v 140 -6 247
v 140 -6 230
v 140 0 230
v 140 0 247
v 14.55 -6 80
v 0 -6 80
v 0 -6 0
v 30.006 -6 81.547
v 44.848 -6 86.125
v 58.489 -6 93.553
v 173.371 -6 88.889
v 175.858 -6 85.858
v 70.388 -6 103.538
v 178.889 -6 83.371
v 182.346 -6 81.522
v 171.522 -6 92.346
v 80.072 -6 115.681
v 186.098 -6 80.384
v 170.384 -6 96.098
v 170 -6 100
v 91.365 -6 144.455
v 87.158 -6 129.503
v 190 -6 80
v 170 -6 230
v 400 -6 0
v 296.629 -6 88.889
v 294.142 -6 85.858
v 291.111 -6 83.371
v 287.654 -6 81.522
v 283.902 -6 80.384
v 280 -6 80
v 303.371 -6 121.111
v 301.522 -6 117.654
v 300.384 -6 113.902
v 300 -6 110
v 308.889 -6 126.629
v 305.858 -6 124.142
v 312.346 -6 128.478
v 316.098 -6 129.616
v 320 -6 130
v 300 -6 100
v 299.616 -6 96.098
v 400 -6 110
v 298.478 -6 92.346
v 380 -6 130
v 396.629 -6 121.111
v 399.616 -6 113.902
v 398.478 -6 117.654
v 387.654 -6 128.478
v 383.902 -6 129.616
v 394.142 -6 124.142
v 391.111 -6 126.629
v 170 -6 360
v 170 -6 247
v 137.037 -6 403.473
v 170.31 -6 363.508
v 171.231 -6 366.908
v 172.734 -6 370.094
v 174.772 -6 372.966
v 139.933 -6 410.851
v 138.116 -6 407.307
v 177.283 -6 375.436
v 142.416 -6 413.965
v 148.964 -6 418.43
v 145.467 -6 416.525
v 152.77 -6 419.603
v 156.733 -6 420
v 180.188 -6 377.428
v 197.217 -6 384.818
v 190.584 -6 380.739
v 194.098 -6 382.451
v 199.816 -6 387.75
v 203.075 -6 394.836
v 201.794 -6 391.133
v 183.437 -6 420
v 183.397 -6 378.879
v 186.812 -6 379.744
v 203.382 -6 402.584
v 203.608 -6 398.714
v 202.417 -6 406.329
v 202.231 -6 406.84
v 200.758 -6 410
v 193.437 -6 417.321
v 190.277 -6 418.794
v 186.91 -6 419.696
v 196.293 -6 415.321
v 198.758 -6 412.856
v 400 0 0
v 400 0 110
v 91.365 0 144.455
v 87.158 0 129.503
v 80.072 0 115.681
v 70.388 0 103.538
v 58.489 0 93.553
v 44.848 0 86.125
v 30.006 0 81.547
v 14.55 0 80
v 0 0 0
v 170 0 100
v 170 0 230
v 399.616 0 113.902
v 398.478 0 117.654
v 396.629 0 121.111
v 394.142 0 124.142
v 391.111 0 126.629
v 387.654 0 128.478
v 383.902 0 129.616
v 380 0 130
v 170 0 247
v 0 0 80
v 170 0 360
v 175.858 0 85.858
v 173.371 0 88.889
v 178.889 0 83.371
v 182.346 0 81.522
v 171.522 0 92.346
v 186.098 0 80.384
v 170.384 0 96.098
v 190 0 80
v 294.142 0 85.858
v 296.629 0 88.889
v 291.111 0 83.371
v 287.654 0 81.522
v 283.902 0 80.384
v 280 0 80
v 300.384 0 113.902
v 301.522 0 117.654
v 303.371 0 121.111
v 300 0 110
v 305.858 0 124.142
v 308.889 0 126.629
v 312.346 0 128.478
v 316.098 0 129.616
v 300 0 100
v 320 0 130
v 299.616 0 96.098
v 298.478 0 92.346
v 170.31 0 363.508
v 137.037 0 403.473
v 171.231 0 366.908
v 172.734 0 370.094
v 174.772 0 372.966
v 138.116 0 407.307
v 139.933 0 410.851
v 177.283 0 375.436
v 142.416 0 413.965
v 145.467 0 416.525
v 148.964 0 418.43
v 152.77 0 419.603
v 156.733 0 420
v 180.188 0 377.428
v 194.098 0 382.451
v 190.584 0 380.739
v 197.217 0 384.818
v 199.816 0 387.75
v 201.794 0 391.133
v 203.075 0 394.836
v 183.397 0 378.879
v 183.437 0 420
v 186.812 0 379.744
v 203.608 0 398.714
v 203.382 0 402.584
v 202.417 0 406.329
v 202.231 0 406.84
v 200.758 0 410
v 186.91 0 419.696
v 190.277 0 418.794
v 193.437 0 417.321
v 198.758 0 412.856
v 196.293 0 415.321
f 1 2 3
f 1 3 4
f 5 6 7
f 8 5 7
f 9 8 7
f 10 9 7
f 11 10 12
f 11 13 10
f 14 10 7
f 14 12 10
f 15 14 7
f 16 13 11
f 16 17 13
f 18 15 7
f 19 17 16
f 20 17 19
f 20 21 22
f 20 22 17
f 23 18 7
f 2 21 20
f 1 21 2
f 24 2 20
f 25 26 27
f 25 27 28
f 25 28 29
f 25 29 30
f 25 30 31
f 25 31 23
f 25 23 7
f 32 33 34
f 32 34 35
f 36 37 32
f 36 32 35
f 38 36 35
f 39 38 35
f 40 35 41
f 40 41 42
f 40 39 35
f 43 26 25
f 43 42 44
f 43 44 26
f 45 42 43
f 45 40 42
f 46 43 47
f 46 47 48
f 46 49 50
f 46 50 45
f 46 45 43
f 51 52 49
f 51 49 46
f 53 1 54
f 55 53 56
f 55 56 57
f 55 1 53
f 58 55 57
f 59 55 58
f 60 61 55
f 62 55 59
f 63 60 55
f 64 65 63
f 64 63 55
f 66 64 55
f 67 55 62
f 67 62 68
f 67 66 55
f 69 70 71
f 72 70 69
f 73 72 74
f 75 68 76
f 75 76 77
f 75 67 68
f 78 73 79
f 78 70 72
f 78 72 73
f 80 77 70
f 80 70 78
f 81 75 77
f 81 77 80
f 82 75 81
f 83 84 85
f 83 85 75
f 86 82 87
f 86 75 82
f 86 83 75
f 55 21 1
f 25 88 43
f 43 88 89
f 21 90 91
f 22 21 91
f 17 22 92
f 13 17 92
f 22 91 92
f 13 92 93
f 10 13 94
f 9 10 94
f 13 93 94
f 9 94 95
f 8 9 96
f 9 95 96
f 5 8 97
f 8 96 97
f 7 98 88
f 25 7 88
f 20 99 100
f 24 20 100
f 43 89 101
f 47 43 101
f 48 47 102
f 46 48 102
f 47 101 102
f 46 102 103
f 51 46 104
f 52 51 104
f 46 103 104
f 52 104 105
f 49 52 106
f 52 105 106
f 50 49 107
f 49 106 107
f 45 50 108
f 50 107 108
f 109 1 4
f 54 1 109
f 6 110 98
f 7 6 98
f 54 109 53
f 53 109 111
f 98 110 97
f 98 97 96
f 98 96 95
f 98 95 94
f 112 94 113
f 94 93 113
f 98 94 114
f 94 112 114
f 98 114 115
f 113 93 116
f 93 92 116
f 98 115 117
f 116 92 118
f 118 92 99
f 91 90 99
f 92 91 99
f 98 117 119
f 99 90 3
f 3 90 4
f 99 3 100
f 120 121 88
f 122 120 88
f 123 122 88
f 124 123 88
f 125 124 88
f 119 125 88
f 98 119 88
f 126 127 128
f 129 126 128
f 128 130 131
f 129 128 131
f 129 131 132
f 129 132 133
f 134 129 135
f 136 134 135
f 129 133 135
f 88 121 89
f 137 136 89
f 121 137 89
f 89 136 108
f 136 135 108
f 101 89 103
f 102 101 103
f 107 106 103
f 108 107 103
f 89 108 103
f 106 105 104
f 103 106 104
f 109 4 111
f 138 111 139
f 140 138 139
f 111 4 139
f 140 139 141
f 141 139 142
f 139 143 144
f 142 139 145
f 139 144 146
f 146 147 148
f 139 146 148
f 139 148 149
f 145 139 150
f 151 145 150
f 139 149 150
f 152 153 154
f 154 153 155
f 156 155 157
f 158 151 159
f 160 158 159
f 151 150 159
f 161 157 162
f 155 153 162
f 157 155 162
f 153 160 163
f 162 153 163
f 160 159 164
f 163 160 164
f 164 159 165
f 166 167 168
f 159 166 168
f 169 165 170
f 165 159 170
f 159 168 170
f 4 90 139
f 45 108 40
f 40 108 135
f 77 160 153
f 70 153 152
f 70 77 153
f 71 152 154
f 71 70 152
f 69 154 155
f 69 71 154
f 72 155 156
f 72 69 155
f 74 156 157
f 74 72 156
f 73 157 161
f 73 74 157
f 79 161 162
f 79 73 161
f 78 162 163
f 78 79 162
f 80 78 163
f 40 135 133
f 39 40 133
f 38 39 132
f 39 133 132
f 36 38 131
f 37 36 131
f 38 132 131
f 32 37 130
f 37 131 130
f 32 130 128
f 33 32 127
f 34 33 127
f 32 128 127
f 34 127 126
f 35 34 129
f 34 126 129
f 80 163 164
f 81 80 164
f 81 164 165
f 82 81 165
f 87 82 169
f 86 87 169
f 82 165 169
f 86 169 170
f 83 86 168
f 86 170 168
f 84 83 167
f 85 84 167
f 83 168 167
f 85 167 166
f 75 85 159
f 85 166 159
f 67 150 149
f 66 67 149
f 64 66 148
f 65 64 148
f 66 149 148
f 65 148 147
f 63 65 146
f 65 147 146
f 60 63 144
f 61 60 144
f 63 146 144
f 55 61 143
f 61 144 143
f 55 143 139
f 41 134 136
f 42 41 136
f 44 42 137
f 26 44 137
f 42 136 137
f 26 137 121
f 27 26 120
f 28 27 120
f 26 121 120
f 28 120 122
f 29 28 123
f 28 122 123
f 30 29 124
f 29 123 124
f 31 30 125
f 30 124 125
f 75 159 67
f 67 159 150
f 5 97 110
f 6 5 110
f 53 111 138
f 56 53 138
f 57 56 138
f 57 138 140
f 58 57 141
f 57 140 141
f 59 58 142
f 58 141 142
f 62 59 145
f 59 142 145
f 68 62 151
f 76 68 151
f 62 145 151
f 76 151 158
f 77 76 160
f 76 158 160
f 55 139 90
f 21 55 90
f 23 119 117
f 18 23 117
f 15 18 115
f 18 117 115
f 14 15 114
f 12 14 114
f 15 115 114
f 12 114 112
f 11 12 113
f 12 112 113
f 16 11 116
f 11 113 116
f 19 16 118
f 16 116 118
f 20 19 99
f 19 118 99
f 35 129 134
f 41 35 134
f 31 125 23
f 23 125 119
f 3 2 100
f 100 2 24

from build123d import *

# Parameters (mm, degrees)
F1_DEPTH = 6
F2_R     = 20
F4_W     = 58.9145278931
F4_H     = 17
F5_DEPTH = 25


with BuildPart() as f1:
    # F0 (on Front) → F1 (new body)
    with BuildSketch(Plane.XZ):
        with BuildLine():
            Line((0, 80), (0, 0))
            Line((0, 0), (400, 0))
            Line((400, 0), (400, 110))
            ThreePointArc((400, 110), (394.1421356237, 124.1421356237), (380, 130))
            Line((380, 130), (320, 130))
            ThreePointArc((320, 130), (305.8578643763, 124.1421356237), (300, 110))
            Line((300, 110), (300, 100))
            ThreePointArc((300, 100), (294.1421356237, 85.8578643763), (280, 80))
            Line((280, 80), (190, 80))
            ThreePointArc((190, 80), (175.8578643763, 85.8578643763), (170, 100))
            Line((170, 100), (170, 360))
            ThreePointArc((170, 360), (175.8578643763, 374.1421356237), (190, 380))
            Line((190, 380), (212, 380))
            Line((212, 380), (202.2308922809, 406.8404028665))
            ThreePointArc((202.2308922809, 406.8404028665), (194.9085685922, 416.3830408858), (183.4370398652, 420))
            Line((183.4370398652, 420), (156.7331660644, 420))
            ThreePointArc((156.7331660644, 420), (143.8774138707, 415.3208888624), (137.0370110042, 403.4729635533))
            Line((137.0370110042, 403.4729635533), (91.3652335031, 144.455442142))
            ThreePointArc((91.3652335031, 144.455442142), (64.6876623237, 98.2485334367), (14.5502287682, 80))
            Line((14.5502287682, 80), (0, 80))
        make_face()
    extrude(amount=F1_DEPTH)

    # F2
    f2_edges = [f1.edges().sort_by_distance(p)[0] for p in [
        (212, -3, 380),
    ]]
    fillet(f2_edges, radius=F2_R)

    # F4 (on face) → F5 (cut)
    with BuildSketch(Plane.XZ.offset(6)):
        with Locations((169.4572639465, 238.5)):
            Rectangle(F4_W, F4_H)
    extrude(amount=-F5_DEPTH, mode=Mode.SUBTRACT)


solid = f1.part
